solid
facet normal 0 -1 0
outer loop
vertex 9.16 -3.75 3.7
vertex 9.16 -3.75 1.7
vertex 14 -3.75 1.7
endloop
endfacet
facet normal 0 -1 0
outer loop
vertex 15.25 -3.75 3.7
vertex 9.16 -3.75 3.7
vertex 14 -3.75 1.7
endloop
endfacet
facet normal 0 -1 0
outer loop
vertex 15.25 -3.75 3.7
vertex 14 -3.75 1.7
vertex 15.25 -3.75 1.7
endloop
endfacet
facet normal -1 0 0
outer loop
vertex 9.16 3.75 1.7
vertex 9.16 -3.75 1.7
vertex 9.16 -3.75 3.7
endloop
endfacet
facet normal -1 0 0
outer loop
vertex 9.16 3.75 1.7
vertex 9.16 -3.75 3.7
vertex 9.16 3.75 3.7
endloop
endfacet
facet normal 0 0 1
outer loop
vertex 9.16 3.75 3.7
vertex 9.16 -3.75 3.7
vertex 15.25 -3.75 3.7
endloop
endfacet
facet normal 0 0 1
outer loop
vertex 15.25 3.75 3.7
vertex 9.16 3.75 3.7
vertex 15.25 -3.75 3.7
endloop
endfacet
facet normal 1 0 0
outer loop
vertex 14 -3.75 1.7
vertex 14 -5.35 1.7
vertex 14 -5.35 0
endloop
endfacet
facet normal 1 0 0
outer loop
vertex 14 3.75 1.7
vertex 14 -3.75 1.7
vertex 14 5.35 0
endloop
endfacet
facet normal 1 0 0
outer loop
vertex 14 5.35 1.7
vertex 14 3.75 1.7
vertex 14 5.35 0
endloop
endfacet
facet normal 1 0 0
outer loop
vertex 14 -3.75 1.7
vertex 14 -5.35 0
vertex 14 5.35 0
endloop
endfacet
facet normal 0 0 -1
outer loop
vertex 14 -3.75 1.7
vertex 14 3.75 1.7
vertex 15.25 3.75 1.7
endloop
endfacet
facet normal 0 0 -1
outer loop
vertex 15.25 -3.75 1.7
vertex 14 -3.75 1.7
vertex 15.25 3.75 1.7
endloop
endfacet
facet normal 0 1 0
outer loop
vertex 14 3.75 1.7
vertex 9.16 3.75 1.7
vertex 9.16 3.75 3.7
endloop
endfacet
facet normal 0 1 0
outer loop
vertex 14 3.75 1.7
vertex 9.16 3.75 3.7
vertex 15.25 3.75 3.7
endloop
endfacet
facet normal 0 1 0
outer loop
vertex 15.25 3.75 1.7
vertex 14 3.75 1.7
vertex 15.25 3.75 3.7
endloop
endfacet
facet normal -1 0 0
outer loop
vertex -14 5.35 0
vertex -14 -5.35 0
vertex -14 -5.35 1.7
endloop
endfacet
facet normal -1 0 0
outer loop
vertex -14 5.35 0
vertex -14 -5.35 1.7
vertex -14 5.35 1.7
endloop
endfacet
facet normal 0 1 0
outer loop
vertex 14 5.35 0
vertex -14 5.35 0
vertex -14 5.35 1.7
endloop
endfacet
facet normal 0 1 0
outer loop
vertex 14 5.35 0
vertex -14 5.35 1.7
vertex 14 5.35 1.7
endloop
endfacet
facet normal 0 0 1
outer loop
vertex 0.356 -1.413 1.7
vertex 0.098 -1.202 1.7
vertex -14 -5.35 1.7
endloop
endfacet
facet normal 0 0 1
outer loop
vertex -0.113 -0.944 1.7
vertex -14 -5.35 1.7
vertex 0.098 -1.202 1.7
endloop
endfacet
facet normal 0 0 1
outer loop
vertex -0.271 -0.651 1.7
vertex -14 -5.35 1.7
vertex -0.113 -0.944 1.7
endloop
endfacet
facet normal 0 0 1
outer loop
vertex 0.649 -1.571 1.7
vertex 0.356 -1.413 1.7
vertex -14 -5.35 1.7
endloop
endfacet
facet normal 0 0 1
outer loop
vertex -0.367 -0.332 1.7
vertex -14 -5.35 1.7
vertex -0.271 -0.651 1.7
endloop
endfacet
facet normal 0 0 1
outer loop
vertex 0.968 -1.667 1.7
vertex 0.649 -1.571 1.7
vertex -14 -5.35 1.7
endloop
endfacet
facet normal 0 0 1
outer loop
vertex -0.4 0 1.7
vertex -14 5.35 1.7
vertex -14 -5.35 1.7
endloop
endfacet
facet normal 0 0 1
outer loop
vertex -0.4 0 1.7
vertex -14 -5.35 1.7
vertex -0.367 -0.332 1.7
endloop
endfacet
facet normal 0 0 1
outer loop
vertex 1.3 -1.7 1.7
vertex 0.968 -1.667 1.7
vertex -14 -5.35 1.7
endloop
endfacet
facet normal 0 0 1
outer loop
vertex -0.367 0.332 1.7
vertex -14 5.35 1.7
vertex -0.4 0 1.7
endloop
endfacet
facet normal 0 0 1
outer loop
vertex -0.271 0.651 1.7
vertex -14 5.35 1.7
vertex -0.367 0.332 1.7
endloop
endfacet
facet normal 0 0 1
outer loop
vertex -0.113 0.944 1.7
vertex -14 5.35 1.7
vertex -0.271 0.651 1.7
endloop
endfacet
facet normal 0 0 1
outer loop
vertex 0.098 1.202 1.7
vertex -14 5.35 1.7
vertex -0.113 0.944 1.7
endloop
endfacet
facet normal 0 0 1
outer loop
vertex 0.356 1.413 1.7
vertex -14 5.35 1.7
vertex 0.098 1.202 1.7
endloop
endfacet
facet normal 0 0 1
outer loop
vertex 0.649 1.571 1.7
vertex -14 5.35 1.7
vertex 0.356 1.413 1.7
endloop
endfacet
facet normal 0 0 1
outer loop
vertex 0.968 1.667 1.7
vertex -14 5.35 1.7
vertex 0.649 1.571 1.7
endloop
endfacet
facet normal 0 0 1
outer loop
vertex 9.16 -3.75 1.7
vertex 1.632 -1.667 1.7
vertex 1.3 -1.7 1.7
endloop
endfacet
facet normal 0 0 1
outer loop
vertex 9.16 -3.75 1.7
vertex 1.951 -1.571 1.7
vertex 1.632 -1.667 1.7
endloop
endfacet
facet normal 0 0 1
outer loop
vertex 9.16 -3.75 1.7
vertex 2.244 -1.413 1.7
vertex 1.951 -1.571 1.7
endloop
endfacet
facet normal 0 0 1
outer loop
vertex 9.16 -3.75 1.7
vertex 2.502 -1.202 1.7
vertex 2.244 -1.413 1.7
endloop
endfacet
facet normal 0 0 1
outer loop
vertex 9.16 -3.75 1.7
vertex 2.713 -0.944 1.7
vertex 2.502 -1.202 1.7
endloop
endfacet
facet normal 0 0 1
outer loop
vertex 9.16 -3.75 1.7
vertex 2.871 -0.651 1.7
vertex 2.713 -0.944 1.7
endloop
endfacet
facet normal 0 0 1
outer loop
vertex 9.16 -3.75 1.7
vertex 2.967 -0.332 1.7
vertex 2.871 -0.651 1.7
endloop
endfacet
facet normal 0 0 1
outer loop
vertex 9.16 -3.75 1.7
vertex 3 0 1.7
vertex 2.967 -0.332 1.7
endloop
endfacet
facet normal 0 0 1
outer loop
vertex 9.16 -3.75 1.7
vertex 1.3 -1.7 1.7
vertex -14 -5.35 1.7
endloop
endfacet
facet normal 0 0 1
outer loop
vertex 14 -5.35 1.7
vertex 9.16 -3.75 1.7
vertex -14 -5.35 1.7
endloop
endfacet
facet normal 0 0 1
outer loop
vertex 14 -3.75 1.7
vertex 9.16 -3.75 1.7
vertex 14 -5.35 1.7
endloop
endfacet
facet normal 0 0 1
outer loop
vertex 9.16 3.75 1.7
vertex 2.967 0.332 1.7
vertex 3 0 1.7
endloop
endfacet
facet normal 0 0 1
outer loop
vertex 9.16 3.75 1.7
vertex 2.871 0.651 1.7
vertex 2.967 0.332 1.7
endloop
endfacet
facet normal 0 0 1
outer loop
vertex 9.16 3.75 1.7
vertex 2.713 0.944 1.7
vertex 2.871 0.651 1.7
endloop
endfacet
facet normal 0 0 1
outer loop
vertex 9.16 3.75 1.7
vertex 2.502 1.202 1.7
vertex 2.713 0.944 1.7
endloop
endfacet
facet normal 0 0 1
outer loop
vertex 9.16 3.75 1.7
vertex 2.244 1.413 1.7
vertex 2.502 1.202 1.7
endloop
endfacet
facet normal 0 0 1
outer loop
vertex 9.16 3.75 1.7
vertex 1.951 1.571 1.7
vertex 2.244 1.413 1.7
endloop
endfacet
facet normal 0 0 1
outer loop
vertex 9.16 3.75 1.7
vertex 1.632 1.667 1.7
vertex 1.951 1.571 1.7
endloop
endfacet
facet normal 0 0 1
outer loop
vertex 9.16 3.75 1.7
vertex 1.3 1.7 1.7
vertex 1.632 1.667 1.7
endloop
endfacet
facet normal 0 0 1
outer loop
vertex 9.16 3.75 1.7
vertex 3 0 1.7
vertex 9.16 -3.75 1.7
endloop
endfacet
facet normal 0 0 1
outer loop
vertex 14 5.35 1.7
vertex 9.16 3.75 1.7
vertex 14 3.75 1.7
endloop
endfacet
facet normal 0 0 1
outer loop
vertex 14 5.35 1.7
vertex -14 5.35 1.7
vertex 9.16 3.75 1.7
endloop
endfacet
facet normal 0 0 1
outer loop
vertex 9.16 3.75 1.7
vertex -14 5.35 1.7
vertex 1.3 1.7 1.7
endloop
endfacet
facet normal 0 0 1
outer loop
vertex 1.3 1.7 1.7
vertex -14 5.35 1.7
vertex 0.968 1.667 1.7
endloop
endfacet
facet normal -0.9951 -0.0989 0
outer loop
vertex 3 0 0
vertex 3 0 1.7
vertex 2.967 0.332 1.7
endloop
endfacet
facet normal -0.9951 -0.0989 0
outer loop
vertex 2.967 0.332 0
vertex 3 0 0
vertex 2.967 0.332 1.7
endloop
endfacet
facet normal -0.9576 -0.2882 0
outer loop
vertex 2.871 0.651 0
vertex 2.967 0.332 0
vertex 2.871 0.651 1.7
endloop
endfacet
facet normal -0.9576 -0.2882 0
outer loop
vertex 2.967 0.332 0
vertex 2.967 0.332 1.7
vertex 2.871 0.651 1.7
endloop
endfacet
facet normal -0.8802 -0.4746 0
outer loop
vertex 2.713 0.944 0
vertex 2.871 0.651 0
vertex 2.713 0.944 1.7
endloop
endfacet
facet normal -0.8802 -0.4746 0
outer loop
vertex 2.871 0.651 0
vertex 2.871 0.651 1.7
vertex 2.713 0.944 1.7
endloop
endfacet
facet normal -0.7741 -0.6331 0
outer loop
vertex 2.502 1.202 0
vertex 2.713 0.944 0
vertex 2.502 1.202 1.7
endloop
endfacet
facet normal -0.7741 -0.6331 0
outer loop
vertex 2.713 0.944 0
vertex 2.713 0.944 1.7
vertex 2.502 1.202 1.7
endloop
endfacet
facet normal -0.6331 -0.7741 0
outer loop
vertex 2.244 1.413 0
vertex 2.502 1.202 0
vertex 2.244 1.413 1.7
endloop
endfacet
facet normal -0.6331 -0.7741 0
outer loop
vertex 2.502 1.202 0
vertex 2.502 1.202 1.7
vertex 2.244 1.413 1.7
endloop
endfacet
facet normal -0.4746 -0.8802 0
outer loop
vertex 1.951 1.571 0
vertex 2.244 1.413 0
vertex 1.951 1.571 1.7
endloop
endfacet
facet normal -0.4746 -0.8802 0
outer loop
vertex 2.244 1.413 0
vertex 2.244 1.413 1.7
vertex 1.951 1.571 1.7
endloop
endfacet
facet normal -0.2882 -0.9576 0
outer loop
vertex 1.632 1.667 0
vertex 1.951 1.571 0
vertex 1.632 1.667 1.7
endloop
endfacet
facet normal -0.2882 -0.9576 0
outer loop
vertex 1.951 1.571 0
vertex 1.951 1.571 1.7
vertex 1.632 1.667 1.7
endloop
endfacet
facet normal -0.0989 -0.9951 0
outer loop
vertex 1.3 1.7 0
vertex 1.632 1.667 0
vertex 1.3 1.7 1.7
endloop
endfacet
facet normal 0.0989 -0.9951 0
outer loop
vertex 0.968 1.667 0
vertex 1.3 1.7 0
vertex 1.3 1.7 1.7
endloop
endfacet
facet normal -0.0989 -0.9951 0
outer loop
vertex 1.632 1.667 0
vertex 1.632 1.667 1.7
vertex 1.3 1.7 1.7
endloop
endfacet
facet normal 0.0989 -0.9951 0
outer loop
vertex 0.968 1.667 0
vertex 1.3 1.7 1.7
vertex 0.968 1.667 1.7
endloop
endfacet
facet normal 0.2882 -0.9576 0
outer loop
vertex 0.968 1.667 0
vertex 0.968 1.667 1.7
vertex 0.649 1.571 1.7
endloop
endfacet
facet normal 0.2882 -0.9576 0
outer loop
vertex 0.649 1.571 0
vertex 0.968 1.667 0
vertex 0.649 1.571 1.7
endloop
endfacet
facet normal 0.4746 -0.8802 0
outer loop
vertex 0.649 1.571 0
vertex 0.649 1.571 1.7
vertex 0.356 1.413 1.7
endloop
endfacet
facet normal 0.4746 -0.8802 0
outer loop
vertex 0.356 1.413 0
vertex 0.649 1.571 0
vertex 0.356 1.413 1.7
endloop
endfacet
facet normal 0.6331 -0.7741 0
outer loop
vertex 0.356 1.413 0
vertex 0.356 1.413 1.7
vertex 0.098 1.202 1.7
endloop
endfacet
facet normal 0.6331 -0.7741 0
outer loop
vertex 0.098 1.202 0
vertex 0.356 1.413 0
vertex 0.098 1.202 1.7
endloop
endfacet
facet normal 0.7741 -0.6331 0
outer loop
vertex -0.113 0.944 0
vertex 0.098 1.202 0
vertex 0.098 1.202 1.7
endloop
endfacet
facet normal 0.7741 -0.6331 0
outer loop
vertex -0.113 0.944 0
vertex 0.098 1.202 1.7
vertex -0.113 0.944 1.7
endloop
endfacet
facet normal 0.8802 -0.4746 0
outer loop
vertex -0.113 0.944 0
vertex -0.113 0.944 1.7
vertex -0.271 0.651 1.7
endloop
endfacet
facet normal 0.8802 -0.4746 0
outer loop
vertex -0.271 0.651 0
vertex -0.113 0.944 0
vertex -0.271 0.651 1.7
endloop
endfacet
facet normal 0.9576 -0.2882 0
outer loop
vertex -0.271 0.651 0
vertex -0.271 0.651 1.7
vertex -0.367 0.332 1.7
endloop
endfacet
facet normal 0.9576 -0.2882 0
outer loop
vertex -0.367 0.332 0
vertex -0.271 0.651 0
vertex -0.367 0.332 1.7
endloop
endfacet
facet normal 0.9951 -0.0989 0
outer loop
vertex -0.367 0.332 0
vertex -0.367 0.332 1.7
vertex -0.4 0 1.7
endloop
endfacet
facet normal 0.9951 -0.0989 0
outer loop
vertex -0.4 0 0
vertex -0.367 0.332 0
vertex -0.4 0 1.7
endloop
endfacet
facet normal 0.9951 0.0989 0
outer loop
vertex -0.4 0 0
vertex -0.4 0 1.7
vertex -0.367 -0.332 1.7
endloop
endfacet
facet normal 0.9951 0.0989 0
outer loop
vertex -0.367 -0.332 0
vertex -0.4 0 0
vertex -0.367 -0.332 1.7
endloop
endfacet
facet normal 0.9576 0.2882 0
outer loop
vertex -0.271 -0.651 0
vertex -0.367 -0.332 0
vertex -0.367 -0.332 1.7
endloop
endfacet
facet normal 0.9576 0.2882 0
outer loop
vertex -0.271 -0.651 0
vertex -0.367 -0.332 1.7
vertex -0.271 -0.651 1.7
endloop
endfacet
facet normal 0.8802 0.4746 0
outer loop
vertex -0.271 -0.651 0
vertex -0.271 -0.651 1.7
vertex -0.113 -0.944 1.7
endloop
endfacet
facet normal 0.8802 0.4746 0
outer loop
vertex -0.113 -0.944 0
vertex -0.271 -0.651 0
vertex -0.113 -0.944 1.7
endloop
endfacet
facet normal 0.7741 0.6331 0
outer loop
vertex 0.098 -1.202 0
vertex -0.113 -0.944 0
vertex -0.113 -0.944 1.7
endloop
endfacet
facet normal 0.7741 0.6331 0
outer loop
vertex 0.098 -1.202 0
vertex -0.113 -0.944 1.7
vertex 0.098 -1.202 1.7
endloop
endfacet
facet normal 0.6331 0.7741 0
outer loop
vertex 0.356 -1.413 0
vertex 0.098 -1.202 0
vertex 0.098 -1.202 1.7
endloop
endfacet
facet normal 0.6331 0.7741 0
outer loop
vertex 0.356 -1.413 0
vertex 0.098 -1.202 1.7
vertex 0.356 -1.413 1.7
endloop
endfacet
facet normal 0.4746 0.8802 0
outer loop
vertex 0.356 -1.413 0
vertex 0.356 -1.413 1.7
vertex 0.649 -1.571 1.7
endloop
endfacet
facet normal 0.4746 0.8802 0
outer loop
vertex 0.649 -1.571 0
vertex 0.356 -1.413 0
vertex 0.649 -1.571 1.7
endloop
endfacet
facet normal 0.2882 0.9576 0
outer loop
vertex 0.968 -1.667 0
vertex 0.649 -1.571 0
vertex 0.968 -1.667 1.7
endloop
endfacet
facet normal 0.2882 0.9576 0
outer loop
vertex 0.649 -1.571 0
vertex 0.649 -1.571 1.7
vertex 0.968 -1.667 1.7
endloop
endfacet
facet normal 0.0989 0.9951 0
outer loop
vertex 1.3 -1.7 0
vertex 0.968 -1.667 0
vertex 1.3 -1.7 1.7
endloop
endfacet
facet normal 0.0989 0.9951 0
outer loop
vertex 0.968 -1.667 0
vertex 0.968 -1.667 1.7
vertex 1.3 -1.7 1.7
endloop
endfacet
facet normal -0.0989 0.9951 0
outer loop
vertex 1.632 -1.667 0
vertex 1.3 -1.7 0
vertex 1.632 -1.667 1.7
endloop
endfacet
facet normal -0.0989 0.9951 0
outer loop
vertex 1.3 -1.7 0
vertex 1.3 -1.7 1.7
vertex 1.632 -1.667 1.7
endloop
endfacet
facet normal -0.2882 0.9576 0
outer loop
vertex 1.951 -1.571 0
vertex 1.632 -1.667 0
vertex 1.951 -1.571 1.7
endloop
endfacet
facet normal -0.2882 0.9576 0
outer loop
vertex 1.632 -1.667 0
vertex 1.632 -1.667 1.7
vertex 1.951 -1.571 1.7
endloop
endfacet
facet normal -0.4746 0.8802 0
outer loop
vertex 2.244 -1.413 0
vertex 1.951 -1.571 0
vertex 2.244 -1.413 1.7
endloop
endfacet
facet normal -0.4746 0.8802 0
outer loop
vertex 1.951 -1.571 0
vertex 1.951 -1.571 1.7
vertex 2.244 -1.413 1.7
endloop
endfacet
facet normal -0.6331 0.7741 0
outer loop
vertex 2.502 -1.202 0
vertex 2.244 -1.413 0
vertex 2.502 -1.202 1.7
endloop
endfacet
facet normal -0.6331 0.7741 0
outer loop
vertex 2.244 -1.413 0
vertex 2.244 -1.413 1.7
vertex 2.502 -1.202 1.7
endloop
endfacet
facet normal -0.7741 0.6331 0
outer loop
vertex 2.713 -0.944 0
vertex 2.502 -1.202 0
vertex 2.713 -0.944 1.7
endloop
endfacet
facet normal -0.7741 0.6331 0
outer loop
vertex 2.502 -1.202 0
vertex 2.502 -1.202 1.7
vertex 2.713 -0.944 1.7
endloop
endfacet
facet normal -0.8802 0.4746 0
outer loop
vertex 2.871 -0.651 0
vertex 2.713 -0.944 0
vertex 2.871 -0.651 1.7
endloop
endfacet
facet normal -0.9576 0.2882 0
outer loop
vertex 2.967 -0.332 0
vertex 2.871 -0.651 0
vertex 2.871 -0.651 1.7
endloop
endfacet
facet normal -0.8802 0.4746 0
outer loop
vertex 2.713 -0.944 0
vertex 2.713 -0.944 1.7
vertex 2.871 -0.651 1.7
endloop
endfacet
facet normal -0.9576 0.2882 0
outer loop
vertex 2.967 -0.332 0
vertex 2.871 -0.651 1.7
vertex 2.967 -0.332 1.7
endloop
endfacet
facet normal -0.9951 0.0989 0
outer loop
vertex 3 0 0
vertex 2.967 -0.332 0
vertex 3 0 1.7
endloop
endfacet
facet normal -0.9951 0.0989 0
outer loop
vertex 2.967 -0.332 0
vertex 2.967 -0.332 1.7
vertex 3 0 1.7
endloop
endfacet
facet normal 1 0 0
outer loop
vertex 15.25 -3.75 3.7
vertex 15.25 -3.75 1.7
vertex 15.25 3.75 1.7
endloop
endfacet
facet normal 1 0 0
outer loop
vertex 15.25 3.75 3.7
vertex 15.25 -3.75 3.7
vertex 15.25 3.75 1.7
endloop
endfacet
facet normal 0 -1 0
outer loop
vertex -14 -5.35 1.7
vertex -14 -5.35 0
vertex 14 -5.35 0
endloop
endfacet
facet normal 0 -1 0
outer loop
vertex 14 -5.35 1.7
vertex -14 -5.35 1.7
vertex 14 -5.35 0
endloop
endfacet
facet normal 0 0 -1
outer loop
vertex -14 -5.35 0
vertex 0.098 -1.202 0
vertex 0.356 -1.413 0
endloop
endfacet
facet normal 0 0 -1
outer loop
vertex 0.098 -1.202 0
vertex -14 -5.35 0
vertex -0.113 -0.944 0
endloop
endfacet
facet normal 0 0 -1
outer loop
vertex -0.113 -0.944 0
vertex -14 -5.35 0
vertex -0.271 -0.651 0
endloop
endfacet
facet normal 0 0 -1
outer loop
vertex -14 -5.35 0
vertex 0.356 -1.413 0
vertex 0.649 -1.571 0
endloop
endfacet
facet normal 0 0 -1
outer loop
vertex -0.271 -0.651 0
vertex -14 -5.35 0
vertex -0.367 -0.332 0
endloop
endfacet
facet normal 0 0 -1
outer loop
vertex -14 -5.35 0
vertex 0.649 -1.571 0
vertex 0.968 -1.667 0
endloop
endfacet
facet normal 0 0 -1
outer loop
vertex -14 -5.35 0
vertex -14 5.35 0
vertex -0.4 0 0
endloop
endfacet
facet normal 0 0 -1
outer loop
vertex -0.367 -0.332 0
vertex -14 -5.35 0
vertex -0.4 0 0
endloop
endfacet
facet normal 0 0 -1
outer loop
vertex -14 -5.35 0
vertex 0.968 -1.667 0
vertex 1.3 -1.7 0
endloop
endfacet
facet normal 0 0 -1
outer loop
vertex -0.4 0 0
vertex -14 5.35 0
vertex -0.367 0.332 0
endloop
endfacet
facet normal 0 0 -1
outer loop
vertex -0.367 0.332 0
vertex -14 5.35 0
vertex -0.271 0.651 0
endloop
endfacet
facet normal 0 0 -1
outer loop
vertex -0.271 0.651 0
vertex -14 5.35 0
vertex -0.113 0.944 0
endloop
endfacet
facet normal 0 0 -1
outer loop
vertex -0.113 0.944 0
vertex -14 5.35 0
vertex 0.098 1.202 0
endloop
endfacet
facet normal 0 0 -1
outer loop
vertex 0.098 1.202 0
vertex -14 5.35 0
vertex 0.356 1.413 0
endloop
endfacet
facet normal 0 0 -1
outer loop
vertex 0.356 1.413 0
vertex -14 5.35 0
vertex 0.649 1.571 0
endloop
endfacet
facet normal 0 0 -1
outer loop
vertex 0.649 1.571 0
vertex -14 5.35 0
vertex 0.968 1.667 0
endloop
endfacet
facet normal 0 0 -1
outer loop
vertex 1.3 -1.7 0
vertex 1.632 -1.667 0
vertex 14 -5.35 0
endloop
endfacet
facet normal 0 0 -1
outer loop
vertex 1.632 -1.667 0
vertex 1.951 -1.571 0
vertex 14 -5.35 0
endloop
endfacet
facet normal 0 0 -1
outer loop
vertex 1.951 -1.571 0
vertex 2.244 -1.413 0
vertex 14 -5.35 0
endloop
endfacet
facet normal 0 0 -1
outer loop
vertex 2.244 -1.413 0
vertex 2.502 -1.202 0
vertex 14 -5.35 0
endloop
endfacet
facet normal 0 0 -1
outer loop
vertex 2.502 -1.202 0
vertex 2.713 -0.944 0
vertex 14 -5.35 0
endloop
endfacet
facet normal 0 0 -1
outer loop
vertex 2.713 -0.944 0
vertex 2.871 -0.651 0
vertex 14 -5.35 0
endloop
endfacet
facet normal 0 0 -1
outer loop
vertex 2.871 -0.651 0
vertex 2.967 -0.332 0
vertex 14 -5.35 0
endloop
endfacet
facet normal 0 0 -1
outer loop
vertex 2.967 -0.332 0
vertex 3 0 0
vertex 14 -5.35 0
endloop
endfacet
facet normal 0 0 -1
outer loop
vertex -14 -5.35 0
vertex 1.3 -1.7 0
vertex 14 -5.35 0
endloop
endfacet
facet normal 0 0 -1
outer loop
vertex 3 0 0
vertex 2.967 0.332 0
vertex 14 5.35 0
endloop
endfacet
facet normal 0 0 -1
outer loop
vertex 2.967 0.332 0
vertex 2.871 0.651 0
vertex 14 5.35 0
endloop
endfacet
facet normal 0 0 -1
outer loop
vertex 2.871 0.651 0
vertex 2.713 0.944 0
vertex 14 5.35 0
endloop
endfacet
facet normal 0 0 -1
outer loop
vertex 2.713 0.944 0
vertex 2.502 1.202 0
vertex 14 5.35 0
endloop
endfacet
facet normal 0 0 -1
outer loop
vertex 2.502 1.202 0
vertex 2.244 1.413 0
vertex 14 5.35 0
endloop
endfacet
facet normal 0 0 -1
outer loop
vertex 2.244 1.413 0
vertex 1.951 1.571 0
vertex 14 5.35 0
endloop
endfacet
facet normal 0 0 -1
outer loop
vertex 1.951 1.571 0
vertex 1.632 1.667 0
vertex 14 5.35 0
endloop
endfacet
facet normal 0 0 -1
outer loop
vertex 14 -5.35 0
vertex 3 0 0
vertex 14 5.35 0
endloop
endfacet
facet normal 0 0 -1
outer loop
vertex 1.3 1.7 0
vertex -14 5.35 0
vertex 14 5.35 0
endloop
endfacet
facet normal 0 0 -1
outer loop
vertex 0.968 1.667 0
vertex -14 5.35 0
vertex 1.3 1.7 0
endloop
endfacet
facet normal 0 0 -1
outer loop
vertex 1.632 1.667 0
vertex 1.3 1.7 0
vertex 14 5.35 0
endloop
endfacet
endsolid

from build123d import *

# Parameters (mm, degrees)
SKETCH1_W           = 28
SKETCH1_H           = 10.7
BOSS_EXTRUDE1_DEPTH = 1.7
SKETCH2_R           = 1.7
CUT_EXTRUDE1_DEPTH  = 16.083517494
SKETCH3_W           = 6.09
SKETCH3_H           = 7.5
BOSS_EXTRUDE2_DEPTH = 2


with BuildPart() as part:
    # Sketch1 → Boss-Extrude1 (new body)
    with BuildSketch(Plane.XY):
        Rectangle(SKETCH1_W, SKETCH1_H)
    extrude(amount=BOSS_EXTRUDE1_DEPTH)

    # Sketch2 → Cut-Extrude1 (cut, through all)
    with BuildSketch(Plane.XY.offset(1.7)):
        with Locations((1.3, 0)):
            Circle(SKETCH2_R)
    extrude(amount=-CUT_EXTRUDE1_DEPTH, mode=Mode.SUBTRACT)

    # Sketch3 → Boss-Extrude2 (add)
    with BuildSketch(Plane.XY.offset(1.7)):
        with Locations((12.205, 0)):
            Rectangle(SKETCH3_W, SKETCH3_H)
    extrude(amount=BOSS_EXTRUDE2_DEPTH)


solid = part.part
